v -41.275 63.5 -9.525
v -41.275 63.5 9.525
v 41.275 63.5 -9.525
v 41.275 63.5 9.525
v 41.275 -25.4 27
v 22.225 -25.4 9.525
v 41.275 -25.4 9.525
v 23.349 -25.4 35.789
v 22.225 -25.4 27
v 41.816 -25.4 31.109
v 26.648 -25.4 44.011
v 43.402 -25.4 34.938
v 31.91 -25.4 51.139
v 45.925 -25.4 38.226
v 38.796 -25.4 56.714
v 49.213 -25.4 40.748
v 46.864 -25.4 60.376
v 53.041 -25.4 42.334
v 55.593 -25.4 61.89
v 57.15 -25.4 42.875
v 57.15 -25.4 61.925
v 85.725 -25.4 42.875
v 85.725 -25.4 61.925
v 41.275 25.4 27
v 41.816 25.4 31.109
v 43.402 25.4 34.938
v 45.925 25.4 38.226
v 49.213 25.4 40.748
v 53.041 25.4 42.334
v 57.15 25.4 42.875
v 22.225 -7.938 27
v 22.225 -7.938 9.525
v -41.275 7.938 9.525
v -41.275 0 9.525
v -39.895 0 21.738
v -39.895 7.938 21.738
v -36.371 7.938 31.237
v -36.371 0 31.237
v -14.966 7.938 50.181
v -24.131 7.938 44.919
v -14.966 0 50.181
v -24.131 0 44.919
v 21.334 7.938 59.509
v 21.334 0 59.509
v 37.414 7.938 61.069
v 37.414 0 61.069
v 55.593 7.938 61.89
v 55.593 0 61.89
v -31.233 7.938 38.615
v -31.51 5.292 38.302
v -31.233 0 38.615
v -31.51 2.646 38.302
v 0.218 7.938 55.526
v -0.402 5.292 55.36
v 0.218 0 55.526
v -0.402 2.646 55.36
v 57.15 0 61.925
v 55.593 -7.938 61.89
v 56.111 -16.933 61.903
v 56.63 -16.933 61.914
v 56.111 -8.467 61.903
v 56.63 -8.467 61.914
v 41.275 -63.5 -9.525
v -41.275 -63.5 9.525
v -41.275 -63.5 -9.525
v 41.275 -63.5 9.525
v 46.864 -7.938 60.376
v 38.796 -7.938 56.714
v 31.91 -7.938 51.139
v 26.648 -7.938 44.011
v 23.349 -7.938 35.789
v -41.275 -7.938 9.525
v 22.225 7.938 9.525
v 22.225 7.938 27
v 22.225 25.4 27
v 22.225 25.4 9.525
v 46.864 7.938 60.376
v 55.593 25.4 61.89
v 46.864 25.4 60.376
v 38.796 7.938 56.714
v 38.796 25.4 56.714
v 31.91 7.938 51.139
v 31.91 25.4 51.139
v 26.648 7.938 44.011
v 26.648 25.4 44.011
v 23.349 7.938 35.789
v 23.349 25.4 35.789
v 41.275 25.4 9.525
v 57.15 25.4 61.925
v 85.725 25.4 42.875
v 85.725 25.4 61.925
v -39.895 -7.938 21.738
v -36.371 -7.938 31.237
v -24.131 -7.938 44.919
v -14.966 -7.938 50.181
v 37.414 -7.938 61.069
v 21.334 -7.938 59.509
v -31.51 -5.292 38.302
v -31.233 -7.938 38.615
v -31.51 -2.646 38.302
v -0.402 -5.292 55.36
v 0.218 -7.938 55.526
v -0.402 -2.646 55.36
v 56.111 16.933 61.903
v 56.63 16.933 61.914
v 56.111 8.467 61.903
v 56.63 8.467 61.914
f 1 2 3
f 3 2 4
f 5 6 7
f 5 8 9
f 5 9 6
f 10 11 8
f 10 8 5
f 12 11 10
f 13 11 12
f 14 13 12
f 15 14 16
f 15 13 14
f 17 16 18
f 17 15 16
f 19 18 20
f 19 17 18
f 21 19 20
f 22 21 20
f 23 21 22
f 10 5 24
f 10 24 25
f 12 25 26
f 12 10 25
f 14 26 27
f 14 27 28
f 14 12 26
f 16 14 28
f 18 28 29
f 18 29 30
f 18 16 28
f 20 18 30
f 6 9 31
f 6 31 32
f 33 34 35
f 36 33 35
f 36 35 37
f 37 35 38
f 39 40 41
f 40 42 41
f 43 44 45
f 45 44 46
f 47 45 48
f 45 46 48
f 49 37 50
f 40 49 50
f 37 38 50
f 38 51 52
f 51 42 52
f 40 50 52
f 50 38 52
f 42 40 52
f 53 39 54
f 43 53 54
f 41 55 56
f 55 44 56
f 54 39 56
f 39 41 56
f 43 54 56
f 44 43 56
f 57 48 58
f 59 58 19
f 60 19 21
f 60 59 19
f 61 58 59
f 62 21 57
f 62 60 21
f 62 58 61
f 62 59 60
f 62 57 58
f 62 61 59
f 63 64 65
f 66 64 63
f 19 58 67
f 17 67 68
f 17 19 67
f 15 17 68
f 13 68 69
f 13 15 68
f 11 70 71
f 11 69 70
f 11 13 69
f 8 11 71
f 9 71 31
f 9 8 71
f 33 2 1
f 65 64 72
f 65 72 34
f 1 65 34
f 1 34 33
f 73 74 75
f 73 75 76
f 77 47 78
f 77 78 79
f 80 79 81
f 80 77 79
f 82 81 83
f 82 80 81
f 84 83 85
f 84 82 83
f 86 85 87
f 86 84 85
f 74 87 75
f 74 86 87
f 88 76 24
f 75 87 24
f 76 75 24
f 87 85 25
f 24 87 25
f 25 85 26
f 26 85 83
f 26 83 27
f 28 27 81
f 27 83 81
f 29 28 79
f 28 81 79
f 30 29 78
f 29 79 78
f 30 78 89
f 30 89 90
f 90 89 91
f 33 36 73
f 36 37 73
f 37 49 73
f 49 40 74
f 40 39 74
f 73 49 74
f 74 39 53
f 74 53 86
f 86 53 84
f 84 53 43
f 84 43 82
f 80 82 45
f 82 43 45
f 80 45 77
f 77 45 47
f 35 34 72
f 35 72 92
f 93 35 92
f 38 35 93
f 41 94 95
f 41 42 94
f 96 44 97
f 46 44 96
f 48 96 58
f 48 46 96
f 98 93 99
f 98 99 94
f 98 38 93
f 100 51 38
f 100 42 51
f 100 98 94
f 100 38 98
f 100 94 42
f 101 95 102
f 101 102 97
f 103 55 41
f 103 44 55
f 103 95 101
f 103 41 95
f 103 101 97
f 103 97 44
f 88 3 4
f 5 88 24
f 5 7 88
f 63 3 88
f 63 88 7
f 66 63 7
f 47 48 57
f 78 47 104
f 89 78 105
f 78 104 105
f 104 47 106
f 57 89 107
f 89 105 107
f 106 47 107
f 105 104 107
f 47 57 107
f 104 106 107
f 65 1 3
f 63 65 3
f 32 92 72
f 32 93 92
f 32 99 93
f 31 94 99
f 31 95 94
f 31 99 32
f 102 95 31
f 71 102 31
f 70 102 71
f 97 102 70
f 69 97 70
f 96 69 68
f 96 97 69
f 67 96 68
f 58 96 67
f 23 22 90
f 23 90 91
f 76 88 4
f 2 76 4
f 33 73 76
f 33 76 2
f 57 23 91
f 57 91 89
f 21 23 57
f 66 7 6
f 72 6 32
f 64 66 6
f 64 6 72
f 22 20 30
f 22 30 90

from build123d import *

# Parameters (mm, degrees)
F1_DEPTH = 63.5
F0_W     = 25.4
F0_H     = 19.05
F2_DEPTH = 25.4
F3_DEPTH = 7.9375


with BuildPart() as f1:
    # F0 (on Front) → F1 (new body, symmetric)
    with BuildSketch(Plane.XZ):
        Polygon((41.275, -9.525), (41.275, 9.525), (22.225, 9.525), (-41.275, 9.525), (-41.275, -9.525), align=None)
    extrude(amount=F1_DEPTH, both=True)

    # F0 (on Front) → F2 (join, symmetric)
    with BuildSketch(Plane.XZ):
        with BuildLine():
            Line((22.225, 9.525), (41.275, 9.525))
            Line((41.275, 9.525), (41.275, 27.0002))
            ThreePointArc((41.275, 27.0002), (45.9246798487, 38.2255201513), (57.15, 42.8752))
            Line((57.15, 42.8752), (60.325, 42.8752))
            Line((60.325, 42.8752), (60.325, 61.9252))
            Line((60.325, 61.9252), (57.15, 61.9252))
            add(Edge.make_bspline(
                [(55.5932773948, 61.8904886163), (56.1098349358, 61.9028294033), (56.628740299, 61.9143991352), (57.15, 61.9252)],
                knots=[110.6833080475, 110.6833080475, 110.6833080475, 110.6833080475, 111.5045361635, 111.5045361635, 111.5045361635, 111.5045361635], degree=3))
            ThreePointArc((55.5932773948, 61.8904886163), (31.9099112325, 51.1392460459), (22.225, 27.0002))
            Line((22.225, 27.0002), (22.225, 9.525))
        make_face()
        with Locations((73.025, 52.4002)):
            Rectangle(F0_W, F0_H)
    extrude(amount=F2_DEPTH, both=True)

    # F0 (on Front) → F3 (join, symmetric)
    with BuildSketch(Plane.XZ):
        with BuildLine():
            Line((-41.275, 9.525), (22.225, 9.525))
            Line((22.225, 9.525), (22.225, 27.0002))
            ThreePointArc((22.225, 27.0002), (31.9099112325, 51.1392460459), (55.5932773948, 61.8904886163))
            add(Edge.make_bspline(
                [(-41.275, 9.525), (-40.9993751312, 44.557704562), (-14.0272048052, 60.2272246577), (55.5932773948, 61.8904886163)],
                knots=[0, 0, 0, 0, 110.6833080475, 110.6833080475, 110.6833080475, 110.6833080475], degree=3))
        make_face()
    extrude(amount=F3_DEPTH, both=True)


solid = f1.part
